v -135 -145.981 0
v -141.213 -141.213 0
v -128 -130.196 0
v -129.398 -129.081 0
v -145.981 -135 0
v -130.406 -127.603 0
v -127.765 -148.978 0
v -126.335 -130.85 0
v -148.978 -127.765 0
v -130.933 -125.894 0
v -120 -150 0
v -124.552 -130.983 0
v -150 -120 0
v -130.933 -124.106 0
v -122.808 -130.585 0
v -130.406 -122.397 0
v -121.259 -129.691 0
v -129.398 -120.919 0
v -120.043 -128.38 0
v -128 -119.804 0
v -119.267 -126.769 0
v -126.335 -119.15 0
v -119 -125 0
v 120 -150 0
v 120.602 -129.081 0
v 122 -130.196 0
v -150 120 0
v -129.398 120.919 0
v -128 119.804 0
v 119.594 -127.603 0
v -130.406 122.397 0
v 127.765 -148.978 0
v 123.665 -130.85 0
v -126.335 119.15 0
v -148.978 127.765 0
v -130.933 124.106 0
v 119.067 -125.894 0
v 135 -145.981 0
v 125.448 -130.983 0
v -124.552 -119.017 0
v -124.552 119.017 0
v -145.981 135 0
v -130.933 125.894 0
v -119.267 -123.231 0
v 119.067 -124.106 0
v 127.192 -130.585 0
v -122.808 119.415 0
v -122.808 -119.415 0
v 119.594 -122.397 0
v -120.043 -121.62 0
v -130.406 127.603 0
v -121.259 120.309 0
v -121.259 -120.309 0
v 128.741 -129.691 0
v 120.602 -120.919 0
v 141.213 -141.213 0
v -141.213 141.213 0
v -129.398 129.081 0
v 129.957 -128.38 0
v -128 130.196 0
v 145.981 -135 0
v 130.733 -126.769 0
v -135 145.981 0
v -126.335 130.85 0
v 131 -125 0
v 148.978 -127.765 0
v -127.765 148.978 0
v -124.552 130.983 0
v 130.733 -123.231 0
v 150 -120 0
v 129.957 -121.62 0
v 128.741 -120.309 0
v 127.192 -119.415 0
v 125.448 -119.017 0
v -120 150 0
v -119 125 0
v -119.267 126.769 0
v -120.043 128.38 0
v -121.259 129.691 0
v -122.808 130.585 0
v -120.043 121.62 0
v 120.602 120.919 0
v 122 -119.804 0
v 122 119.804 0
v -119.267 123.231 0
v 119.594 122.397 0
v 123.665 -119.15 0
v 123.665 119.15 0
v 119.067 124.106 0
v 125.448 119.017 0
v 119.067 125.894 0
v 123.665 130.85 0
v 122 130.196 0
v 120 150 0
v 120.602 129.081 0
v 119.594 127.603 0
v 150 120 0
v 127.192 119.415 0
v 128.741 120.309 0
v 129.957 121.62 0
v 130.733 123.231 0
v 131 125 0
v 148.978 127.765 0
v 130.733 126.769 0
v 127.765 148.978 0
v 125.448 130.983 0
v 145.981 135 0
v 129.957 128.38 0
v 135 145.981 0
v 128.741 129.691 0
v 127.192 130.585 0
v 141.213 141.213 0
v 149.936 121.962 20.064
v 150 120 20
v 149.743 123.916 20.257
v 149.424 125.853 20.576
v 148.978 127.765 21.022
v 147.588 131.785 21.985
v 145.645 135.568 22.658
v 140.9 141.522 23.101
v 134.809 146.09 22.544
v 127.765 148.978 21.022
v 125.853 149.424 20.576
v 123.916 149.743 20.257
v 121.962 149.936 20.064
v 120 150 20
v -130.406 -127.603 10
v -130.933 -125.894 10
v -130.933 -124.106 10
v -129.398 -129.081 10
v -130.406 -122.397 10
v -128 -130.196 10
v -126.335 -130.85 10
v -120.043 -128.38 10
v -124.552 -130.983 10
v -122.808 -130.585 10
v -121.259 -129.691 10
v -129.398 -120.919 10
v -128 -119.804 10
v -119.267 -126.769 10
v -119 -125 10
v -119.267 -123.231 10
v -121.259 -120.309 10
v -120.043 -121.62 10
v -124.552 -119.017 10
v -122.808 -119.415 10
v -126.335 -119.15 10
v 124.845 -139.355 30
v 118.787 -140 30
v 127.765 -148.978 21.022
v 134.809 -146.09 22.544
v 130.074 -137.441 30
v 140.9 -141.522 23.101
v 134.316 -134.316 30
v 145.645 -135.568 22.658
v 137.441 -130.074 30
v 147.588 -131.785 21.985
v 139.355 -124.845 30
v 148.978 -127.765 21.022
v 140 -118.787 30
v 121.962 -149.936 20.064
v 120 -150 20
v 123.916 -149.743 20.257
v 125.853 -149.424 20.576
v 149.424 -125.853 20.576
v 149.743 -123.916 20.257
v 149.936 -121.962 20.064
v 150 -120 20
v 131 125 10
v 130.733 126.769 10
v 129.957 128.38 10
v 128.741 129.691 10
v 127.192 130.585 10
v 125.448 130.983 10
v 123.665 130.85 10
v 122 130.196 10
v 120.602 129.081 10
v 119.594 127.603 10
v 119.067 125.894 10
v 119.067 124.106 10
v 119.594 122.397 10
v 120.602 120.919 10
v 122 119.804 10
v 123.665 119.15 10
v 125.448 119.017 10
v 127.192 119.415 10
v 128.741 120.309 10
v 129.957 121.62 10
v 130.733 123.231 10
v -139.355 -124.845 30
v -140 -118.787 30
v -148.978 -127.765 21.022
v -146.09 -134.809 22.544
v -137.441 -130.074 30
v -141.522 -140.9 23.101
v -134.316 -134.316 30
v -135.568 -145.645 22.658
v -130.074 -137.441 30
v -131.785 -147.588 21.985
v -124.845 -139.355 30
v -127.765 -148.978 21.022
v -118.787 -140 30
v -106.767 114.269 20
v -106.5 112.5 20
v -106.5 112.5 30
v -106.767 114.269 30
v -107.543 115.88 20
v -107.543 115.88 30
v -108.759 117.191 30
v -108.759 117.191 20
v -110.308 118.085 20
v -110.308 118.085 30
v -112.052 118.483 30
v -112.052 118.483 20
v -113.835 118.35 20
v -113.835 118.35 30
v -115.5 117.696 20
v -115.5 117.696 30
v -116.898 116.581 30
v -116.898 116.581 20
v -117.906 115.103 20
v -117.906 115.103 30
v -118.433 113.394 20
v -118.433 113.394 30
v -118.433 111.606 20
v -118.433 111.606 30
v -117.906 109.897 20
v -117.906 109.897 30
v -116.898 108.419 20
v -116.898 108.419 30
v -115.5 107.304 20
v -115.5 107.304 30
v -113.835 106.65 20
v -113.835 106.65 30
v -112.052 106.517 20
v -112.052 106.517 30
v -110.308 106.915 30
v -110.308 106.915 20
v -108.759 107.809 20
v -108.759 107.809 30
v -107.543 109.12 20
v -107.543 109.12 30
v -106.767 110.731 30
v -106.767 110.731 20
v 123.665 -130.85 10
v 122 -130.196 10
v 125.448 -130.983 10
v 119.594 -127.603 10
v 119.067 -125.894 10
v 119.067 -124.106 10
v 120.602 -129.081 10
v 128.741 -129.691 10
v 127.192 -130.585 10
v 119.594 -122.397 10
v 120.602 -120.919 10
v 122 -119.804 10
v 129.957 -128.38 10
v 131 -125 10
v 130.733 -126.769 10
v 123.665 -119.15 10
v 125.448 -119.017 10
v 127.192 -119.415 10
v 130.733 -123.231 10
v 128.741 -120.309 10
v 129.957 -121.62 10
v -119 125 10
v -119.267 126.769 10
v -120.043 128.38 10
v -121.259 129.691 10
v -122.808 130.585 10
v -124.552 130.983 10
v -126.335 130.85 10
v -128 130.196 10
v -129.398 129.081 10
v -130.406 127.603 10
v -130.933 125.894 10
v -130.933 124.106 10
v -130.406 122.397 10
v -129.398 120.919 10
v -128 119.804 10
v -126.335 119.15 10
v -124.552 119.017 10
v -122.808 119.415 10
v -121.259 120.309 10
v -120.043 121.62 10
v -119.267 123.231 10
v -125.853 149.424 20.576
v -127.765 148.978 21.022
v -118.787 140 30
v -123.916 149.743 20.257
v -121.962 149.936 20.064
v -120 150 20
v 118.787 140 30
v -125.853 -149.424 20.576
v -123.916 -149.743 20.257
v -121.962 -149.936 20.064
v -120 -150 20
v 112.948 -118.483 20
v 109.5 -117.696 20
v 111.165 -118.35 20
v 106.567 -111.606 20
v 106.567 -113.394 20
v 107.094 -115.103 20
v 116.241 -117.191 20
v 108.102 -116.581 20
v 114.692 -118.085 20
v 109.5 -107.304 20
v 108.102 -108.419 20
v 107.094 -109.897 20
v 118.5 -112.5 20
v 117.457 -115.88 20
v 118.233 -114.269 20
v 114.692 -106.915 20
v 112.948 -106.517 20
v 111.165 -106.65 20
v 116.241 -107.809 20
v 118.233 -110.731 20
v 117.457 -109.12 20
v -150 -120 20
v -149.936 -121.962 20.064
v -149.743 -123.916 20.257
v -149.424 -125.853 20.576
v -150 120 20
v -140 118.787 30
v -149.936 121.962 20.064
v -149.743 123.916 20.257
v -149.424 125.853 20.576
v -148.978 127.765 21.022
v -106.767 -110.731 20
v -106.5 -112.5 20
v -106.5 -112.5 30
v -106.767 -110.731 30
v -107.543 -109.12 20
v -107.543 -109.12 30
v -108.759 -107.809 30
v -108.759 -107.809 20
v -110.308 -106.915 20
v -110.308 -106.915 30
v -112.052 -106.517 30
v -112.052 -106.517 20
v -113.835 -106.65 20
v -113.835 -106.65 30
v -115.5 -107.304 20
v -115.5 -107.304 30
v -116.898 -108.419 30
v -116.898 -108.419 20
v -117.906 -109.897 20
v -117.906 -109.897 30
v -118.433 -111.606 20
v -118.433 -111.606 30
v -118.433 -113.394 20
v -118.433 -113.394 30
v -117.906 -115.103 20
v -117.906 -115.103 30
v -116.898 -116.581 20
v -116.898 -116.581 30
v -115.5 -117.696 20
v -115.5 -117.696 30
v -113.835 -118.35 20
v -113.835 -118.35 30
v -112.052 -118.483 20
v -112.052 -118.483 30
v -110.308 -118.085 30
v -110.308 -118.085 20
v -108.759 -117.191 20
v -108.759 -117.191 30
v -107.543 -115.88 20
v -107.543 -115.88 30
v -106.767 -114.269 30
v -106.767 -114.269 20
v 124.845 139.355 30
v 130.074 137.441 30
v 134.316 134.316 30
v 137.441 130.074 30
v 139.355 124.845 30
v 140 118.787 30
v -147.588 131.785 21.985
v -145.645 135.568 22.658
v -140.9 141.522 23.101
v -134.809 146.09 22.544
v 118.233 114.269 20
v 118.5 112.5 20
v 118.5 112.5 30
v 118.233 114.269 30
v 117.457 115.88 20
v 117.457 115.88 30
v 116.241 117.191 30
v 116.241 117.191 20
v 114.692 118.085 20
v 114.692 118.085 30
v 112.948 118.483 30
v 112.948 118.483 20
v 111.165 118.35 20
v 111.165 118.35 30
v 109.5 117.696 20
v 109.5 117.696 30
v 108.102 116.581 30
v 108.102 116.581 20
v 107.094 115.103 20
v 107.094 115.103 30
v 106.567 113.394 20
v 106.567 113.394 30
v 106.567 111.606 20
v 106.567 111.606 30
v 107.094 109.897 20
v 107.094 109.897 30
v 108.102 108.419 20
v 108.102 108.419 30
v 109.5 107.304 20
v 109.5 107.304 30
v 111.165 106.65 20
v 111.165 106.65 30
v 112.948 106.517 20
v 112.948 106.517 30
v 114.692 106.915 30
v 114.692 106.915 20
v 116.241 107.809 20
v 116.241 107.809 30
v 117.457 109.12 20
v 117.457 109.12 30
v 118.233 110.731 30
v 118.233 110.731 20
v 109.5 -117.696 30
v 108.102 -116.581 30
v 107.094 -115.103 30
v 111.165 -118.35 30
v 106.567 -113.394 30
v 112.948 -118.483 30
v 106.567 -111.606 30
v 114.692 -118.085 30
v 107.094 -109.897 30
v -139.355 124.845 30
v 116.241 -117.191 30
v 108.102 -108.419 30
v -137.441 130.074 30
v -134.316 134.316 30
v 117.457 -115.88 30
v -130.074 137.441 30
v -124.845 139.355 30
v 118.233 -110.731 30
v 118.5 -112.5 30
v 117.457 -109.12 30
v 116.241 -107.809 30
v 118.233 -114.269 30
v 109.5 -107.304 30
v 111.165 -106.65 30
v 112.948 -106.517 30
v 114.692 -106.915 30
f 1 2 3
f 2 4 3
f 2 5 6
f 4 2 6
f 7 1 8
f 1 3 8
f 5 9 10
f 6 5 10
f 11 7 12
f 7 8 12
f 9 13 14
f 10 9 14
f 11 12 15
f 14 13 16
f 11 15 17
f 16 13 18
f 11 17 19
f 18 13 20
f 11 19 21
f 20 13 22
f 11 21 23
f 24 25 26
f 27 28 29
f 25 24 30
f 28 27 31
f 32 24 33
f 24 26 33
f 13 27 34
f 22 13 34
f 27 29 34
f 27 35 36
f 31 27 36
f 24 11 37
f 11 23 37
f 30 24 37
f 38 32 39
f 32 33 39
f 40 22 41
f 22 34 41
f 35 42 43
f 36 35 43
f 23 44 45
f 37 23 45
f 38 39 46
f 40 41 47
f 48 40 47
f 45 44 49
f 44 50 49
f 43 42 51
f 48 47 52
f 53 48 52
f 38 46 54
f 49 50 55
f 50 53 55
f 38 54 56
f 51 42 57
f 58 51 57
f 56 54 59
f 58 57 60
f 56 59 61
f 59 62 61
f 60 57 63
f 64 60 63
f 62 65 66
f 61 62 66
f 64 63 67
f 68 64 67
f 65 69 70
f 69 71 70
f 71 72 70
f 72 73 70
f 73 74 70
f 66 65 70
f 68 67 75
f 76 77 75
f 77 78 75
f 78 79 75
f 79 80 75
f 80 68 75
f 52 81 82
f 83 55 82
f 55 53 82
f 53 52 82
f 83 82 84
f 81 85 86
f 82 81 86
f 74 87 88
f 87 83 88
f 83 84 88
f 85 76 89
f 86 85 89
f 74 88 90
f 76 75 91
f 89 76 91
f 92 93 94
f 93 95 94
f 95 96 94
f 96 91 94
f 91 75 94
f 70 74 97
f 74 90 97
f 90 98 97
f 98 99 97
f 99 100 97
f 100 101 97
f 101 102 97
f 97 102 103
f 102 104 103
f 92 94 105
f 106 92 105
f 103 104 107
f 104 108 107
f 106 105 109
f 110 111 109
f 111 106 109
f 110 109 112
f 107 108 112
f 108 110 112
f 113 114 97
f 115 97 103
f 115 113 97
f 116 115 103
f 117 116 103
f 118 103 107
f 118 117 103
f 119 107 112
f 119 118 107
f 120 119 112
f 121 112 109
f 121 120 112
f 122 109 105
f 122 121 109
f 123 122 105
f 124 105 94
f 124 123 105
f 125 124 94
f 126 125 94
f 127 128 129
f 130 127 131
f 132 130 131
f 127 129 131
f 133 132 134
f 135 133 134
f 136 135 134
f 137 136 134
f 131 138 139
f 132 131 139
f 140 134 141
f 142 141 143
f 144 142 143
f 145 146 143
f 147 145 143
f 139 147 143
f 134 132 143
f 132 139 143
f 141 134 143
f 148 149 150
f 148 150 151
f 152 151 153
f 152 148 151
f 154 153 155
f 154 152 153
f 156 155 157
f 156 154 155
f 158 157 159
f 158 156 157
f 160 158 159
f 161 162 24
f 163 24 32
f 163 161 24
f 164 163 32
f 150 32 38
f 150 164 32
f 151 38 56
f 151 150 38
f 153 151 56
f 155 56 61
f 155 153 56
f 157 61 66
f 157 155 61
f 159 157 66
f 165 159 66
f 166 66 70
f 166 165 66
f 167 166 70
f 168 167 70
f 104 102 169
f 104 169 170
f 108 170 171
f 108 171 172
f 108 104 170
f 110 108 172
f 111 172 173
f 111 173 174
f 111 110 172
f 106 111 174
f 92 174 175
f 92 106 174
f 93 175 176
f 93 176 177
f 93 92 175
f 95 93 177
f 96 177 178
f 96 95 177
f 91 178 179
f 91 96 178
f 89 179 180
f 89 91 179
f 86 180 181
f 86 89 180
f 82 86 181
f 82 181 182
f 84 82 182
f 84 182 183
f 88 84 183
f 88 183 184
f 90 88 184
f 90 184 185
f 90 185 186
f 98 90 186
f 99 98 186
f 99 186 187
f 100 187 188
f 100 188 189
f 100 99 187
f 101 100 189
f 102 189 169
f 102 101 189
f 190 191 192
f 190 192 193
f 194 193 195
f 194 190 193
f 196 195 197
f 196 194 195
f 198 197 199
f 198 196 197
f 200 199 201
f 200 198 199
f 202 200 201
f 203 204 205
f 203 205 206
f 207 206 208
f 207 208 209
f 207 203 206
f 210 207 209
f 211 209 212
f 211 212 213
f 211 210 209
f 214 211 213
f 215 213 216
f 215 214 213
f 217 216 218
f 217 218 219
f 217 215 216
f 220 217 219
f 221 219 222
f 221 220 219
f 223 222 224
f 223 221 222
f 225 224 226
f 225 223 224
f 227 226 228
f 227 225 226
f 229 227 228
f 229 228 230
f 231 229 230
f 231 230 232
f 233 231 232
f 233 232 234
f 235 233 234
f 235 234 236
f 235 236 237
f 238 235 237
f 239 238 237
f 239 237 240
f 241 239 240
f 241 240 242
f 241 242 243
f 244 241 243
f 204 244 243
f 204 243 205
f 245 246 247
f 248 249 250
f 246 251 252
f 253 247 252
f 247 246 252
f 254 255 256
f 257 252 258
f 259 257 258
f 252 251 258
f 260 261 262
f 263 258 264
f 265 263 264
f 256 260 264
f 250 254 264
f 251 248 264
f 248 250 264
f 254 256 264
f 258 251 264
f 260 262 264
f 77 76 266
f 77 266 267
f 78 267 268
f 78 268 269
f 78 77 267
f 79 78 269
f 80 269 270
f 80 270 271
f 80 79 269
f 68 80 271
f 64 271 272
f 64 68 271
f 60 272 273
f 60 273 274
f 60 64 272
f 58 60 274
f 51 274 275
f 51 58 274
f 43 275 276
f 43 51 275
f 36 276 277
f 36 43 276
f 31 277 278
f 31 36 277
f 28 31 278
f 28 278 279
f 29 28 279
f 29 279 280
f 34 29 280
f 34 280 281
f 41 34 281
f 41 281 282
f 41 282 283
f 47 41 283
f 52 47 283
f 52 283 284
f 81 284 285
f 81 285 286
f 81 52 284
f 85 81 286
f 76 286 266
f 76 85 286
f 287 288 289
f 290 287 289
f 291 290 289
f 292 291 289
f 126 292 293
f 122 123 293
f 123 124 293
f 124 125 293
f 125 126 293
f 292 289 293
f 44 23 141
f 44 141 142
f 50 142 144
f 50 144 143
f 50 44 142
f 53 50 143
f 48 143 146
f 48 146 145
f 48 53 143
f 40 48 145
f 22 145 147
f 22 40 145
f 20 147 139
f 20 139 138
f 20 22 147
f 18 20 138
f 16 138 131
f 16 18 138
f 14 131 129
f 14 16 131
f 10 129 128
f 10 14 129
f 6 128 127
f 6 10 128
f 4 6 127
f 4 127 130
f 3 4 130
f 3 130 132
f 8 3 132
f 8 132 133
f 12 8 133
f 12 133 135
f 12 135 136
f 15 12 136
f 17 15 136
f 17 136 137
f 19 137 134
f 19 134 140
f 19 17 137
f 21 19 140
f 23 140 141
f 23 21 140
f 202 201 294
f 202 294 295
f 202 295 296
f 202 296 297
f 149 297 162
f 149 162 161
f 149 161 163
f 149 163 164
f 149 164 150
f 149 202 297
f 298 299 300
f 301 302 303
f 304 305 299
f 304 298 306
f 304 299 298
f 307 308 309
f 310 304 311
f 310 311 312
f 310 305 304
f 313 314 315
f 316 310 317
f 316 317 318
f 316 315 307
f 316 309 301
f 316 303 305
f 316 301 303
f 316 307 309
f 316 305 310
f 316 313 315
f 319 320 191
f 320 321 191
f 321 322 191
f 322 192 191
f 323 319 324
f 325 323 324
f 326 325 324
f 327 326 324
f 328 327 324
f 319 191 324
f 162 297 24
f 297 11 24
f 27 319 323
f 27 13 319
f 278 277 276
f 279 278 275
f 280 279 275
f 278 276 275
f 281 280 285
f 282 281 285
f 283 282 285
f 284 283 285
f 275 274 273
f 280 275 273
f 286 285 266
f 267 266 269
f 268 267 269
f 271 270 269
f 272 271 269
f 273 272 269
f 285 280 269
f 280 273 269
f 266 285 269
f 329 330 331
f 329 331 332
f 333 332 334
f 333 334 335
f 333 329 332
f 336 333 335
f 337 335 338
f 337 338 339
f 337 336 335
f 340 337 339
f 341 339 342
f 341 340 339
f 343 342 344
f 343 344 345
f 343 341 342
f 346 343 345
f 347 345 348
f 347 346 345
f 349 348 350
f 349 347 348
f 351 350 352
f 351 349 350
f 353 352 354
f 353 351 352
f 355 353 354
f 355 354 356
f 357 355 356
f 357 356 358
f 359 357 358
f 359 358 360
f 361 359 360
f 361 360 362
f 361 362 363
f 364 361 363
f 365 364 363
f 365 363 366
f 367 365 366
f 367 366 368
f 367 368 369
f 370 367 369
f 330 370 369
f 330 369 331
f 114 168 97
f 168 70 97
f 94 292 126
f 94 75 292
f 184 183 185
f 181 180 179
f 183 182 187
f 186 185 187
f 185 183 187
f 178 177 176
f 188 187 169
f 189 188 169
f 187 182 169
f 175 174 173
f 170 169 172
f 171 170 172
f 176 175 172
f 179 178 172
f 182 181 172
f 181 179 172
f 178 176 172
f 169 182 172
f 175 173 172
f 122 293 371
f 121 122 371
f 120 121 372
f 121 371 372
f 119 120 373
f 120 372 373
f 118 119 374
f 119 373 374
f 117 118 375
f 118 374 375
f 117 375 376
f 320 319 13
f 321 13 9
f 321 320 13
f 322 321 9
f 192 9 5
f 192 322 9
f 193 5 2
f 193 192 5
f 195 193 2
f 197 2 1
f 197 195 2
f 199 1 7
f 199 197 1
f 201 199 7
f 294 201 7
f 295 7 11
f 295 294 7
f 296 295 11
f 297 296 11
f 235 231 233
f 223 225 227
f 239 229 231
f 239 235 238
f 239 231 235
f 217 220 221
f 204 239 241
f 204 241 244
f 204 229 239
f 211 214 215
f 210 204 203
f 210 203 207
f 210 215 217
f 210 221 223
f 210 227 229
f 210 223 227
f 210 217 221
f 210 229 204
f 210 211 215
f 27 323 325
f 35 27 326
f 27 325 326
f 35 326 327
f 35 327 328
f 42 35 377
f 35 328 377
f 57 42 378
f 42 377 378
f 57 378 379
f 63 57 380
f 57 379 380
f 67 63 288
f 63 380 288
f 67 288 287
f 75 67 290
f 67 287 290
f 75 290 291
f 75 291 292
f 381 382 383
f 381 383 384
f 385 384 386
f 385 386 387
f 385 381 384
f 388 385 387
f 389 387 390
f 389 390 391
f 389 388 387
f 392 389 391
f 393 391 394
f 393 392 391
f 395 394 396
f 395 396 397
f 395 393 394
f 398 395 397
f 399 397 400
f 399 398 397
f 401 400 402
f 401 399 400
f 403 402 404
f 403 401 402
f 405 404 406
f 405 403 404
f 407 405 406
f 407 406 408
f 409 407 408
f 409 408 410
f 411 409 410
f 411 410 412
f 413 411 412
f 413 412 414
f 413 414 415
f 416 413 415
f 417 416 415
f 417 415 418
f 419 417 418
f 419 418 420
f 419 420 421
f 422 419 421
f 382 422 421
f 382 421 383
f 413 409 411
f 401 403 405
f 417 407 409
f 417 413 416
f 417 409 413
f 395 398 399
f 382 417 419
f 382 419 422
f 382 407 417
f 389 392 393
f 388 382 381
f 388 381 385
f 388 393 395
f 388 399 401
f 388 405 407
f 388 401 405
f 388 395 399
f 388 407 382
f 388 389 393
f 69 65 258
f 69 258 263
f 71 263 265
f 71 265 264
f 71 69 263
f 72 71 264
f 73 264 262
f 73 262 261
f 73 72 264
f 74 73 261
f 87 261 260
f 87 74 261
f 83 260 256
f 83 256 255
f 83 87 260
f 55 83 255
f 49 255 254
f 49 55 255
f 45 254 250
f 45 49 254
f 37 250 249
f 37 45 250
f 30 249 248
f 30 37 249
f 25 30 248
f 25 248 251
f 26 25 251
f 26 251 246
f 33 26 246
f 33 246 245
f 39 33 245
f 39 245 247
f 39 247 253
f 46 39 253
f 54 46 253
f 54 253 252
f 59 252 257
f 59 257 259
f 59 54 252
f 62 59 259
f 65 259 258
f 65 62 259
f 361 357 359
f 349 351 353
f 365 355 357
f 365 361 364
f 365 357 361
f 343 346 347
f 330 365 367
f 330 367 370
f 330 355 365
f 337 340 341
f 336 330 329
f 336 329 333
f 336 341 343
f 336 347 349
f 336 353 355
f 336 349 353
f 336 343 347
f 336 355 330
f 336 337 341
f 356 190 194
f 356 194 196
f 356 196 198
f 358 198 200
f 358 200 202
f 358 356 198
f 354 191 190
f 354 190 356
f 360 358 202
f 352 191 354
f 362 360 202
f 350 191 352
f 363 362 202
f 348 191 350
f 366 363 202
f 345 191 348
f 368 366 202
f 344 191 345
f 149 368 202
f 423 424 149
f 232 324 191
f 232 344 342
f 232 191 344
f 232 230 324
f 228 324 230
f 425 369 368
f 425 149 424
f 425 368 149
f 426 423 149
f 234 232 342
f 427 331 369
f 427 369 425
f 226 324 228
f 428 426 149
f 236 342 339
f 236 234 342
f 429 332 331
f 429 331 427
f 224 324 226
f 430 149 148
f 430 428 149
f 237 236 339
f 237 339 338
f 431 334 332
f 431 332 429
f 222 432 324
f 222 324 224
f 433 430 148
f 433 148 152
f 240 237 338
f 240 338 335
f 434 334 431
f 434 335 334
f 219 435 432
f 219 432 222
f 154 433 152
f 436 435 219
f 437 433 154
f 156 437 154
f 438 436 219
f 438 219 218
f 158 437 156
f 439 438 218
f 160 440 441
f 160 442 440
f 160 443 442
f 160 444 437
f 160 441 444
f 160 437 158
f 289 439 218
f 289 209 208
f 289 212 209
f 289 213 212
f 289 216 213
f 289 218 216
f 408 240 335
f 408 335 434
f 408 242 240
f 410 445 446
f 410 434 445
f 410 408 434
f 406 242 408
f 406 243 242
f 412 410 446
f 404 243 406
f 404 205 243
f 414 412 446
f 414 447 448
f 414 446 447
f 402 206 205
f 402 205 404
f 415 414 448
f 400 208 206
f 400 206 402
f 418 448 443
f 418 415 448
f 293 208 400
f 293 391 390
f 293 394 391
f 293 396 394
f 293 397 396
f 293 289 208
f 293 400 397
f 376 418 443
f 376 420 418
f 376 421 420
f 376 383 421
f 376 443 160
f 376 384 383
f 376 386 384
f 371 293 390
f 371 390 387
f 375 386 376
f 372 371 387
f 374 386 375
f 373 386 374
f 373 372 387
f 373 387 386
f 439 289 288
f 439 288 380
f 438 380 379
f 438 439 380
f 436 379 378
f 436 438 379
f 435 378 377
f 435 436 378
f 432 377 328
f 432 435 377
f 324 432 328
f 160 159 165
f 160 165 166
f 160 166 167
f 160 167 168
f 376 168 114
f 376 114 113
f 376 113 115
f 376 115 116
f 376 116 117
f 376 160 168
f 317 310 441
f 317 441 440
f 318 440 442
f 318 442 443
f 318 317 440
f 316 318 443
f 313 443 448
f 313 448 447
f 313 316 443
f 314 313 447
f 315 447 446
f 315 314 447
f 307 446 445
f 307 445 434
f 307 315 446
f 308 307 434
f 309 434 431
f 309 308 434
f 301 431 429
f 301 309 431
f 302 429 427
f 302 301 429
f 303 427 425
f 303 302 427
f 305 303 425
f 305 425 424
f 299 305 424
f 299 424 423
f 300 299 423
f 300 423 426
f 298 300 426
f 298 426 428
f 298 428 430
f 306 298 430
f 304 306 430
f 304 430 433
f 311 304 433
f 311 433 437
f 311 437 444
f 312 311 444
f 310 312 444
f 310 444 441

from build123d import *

# Parameters (mm, degrees)
F0_W     = 300
F0_H     = 300
F0_R     = 6
F1_DEPTH = 30
F2_DEPTH = 10
F3_DEPTH = 20
F4_SIZE2 = 10
F4_SIZE  = 10
F5_F1_R  = 30
F5_F2_R  = 30
F5_F3_R  = 30
F5_F4_R  = 30
F5_F5_R  = 30
F5_F6_R  = 30
F5_F7_R  = 30
F5_F8_R  = 30


with BuildPart() as f1:
    # F0 (on Top) → F1 (new body)
    with BuildSketch(Plane.XY):
        Rectangle(F0_W, F0_H)
        with Locations((-125, -125)):
            Circle(F0_R, mode=Mode.SUBTRACT)
        with Locations((-112.5, -112.5)):
            Circle(F0_R, mode=Mode.SUBTRACT)
        with Locations((125, -125)):
            Circle(F0_R, mode=Mode.SUBTRACT)
        with Locations((112.5, -112.5)):
            Circle(F0_R, mode=Mode.SUBTRACT)
        with Locations((-125, 125)):
            Circle(F0_R, mode=Mode.SUBTRACT)
        with Locations((-112.5, 112.5)):
            Circle(F0_R, mode=Mode.SUBTRACT)
        with Locations((112.5, 112.5)):
            Circle(F0_R, mode=Mode.SUBTRACT)
        with Locations((125, 125)):
            Circle(F0_R, mode=Mode.SUBTRACT)
        with Locations((-125, -125)):
            Circle(F0_R)
        with Locations((-125, 125)):
            Circle(F0_R)
        with Locations((125, 125)):
            Circle(F0_R)
        with Locations((125, -125)):
            Circle(F0_R)
    extrude(amount=F1_DEPTH)

    # F0 (on Top) → F2 (cut)
    with BuildSketch(Plane.XY):
        with Locations((-125, -125)):
            Circle(F0_R)
        with Locations((-125, 125)):
            Circle(F0_R)
        with Locations((125, 125)):
            Circle(F0_R)
        with Locations((125, -125)):
            Circle(F0_R)
    extrude(amount=F2_DEPTH, mode=Mode.SUBTRACT)

    # F0 (on Top) → F3 (join)
    with BuildSketch(Plane.XY):
        with Locations((-112.5, 112.5)):
            Circle(F0_R)
        with Locations((-112.5, -112.5)):
            Circle(F0_R)
        with Locations((112.5, 112.5)):
            Circle(F0_R)
        with Locations((112.5, -112.5)):
            Circle(F0_R)
    extrude(amount=F3_DEPTH)

    # F4
    f4_edges = [f1.edges().sort_by_distance(p)[0] for p in [
        (0, -150, 30),
        (-150, 0, 30),
        (150, 0, 30),
        (0, 150, 30),
    ]]
    chamfer(f4_edges, length=F4_SIZE, length2=F4_SIZE2)

    # F5: fillet of radius 30 on 8 edges, made by hand

    # F5_f1
    f5_f1_edges = [f1.edges().sort_by_distance(p)[0] for p in [
        (-150, -150, 10),
    ]]
    fillet(f5_f1_edges, radius=F5_F1_R)

    # F5_f2
    f5_f2_edges = [f1.edges().sort_by_distance(p)[0] for p in [
        (150, -150, 10),
    ]]
    fillet(f5_f2_edges, radius=F5_F2_R)

    # F5_f3
    f5_f3_edges = [f1.edges().sort_by_distance(p)[0] for p in [
        (-150, 150, 10),
    ]]
    fillet(f5_f3_edges, radius=F5_F3_R)

    # F5_f4
    f5_f4_edges = [f1.edges().sort_by_distance(p)[0] for p in [
        (-140.6066017178, -140.6066017178, 29.3933982822),
    ]]
    fillet(f5_f4_edges, radius=F5_F4_R)

    # F5_f5
    f5_f5_edges = [f1.edges().sort_by_distance(p)[0] for p in [
        (140.6066017178, -140.6066017178, 29.3933982822),
    ]]
    fillet(f5_f5_edges, radius=F5_F5_R)

    # F5_f6
    f5_f6_edges = [f1.edges().sort_by_distance(p)[0] for p in [
        (150, 150, 10),
    ]]
    fillet(f5_f6_edges, radius=F5_F6_R)

    # F5_f7
    f5_f7_edges = [f1.edges().sort_by_distance(p)[0] for p in [
        (-140.6066017178, 140.6066017178, 29.3933982822),
    ]]
    fillet(f5_f7_edges, radius=F5_F7_R)

    # F5_f8
    f5_f8_edges = [f1.edges().sort_by_distance(p)[0] for p in [
        (140.6066017178, 140.6066017178, 29.3933982822),
    ]]
    fillet(f5_f8_edges, radius=F5_F8_R)


solid = f1.part
